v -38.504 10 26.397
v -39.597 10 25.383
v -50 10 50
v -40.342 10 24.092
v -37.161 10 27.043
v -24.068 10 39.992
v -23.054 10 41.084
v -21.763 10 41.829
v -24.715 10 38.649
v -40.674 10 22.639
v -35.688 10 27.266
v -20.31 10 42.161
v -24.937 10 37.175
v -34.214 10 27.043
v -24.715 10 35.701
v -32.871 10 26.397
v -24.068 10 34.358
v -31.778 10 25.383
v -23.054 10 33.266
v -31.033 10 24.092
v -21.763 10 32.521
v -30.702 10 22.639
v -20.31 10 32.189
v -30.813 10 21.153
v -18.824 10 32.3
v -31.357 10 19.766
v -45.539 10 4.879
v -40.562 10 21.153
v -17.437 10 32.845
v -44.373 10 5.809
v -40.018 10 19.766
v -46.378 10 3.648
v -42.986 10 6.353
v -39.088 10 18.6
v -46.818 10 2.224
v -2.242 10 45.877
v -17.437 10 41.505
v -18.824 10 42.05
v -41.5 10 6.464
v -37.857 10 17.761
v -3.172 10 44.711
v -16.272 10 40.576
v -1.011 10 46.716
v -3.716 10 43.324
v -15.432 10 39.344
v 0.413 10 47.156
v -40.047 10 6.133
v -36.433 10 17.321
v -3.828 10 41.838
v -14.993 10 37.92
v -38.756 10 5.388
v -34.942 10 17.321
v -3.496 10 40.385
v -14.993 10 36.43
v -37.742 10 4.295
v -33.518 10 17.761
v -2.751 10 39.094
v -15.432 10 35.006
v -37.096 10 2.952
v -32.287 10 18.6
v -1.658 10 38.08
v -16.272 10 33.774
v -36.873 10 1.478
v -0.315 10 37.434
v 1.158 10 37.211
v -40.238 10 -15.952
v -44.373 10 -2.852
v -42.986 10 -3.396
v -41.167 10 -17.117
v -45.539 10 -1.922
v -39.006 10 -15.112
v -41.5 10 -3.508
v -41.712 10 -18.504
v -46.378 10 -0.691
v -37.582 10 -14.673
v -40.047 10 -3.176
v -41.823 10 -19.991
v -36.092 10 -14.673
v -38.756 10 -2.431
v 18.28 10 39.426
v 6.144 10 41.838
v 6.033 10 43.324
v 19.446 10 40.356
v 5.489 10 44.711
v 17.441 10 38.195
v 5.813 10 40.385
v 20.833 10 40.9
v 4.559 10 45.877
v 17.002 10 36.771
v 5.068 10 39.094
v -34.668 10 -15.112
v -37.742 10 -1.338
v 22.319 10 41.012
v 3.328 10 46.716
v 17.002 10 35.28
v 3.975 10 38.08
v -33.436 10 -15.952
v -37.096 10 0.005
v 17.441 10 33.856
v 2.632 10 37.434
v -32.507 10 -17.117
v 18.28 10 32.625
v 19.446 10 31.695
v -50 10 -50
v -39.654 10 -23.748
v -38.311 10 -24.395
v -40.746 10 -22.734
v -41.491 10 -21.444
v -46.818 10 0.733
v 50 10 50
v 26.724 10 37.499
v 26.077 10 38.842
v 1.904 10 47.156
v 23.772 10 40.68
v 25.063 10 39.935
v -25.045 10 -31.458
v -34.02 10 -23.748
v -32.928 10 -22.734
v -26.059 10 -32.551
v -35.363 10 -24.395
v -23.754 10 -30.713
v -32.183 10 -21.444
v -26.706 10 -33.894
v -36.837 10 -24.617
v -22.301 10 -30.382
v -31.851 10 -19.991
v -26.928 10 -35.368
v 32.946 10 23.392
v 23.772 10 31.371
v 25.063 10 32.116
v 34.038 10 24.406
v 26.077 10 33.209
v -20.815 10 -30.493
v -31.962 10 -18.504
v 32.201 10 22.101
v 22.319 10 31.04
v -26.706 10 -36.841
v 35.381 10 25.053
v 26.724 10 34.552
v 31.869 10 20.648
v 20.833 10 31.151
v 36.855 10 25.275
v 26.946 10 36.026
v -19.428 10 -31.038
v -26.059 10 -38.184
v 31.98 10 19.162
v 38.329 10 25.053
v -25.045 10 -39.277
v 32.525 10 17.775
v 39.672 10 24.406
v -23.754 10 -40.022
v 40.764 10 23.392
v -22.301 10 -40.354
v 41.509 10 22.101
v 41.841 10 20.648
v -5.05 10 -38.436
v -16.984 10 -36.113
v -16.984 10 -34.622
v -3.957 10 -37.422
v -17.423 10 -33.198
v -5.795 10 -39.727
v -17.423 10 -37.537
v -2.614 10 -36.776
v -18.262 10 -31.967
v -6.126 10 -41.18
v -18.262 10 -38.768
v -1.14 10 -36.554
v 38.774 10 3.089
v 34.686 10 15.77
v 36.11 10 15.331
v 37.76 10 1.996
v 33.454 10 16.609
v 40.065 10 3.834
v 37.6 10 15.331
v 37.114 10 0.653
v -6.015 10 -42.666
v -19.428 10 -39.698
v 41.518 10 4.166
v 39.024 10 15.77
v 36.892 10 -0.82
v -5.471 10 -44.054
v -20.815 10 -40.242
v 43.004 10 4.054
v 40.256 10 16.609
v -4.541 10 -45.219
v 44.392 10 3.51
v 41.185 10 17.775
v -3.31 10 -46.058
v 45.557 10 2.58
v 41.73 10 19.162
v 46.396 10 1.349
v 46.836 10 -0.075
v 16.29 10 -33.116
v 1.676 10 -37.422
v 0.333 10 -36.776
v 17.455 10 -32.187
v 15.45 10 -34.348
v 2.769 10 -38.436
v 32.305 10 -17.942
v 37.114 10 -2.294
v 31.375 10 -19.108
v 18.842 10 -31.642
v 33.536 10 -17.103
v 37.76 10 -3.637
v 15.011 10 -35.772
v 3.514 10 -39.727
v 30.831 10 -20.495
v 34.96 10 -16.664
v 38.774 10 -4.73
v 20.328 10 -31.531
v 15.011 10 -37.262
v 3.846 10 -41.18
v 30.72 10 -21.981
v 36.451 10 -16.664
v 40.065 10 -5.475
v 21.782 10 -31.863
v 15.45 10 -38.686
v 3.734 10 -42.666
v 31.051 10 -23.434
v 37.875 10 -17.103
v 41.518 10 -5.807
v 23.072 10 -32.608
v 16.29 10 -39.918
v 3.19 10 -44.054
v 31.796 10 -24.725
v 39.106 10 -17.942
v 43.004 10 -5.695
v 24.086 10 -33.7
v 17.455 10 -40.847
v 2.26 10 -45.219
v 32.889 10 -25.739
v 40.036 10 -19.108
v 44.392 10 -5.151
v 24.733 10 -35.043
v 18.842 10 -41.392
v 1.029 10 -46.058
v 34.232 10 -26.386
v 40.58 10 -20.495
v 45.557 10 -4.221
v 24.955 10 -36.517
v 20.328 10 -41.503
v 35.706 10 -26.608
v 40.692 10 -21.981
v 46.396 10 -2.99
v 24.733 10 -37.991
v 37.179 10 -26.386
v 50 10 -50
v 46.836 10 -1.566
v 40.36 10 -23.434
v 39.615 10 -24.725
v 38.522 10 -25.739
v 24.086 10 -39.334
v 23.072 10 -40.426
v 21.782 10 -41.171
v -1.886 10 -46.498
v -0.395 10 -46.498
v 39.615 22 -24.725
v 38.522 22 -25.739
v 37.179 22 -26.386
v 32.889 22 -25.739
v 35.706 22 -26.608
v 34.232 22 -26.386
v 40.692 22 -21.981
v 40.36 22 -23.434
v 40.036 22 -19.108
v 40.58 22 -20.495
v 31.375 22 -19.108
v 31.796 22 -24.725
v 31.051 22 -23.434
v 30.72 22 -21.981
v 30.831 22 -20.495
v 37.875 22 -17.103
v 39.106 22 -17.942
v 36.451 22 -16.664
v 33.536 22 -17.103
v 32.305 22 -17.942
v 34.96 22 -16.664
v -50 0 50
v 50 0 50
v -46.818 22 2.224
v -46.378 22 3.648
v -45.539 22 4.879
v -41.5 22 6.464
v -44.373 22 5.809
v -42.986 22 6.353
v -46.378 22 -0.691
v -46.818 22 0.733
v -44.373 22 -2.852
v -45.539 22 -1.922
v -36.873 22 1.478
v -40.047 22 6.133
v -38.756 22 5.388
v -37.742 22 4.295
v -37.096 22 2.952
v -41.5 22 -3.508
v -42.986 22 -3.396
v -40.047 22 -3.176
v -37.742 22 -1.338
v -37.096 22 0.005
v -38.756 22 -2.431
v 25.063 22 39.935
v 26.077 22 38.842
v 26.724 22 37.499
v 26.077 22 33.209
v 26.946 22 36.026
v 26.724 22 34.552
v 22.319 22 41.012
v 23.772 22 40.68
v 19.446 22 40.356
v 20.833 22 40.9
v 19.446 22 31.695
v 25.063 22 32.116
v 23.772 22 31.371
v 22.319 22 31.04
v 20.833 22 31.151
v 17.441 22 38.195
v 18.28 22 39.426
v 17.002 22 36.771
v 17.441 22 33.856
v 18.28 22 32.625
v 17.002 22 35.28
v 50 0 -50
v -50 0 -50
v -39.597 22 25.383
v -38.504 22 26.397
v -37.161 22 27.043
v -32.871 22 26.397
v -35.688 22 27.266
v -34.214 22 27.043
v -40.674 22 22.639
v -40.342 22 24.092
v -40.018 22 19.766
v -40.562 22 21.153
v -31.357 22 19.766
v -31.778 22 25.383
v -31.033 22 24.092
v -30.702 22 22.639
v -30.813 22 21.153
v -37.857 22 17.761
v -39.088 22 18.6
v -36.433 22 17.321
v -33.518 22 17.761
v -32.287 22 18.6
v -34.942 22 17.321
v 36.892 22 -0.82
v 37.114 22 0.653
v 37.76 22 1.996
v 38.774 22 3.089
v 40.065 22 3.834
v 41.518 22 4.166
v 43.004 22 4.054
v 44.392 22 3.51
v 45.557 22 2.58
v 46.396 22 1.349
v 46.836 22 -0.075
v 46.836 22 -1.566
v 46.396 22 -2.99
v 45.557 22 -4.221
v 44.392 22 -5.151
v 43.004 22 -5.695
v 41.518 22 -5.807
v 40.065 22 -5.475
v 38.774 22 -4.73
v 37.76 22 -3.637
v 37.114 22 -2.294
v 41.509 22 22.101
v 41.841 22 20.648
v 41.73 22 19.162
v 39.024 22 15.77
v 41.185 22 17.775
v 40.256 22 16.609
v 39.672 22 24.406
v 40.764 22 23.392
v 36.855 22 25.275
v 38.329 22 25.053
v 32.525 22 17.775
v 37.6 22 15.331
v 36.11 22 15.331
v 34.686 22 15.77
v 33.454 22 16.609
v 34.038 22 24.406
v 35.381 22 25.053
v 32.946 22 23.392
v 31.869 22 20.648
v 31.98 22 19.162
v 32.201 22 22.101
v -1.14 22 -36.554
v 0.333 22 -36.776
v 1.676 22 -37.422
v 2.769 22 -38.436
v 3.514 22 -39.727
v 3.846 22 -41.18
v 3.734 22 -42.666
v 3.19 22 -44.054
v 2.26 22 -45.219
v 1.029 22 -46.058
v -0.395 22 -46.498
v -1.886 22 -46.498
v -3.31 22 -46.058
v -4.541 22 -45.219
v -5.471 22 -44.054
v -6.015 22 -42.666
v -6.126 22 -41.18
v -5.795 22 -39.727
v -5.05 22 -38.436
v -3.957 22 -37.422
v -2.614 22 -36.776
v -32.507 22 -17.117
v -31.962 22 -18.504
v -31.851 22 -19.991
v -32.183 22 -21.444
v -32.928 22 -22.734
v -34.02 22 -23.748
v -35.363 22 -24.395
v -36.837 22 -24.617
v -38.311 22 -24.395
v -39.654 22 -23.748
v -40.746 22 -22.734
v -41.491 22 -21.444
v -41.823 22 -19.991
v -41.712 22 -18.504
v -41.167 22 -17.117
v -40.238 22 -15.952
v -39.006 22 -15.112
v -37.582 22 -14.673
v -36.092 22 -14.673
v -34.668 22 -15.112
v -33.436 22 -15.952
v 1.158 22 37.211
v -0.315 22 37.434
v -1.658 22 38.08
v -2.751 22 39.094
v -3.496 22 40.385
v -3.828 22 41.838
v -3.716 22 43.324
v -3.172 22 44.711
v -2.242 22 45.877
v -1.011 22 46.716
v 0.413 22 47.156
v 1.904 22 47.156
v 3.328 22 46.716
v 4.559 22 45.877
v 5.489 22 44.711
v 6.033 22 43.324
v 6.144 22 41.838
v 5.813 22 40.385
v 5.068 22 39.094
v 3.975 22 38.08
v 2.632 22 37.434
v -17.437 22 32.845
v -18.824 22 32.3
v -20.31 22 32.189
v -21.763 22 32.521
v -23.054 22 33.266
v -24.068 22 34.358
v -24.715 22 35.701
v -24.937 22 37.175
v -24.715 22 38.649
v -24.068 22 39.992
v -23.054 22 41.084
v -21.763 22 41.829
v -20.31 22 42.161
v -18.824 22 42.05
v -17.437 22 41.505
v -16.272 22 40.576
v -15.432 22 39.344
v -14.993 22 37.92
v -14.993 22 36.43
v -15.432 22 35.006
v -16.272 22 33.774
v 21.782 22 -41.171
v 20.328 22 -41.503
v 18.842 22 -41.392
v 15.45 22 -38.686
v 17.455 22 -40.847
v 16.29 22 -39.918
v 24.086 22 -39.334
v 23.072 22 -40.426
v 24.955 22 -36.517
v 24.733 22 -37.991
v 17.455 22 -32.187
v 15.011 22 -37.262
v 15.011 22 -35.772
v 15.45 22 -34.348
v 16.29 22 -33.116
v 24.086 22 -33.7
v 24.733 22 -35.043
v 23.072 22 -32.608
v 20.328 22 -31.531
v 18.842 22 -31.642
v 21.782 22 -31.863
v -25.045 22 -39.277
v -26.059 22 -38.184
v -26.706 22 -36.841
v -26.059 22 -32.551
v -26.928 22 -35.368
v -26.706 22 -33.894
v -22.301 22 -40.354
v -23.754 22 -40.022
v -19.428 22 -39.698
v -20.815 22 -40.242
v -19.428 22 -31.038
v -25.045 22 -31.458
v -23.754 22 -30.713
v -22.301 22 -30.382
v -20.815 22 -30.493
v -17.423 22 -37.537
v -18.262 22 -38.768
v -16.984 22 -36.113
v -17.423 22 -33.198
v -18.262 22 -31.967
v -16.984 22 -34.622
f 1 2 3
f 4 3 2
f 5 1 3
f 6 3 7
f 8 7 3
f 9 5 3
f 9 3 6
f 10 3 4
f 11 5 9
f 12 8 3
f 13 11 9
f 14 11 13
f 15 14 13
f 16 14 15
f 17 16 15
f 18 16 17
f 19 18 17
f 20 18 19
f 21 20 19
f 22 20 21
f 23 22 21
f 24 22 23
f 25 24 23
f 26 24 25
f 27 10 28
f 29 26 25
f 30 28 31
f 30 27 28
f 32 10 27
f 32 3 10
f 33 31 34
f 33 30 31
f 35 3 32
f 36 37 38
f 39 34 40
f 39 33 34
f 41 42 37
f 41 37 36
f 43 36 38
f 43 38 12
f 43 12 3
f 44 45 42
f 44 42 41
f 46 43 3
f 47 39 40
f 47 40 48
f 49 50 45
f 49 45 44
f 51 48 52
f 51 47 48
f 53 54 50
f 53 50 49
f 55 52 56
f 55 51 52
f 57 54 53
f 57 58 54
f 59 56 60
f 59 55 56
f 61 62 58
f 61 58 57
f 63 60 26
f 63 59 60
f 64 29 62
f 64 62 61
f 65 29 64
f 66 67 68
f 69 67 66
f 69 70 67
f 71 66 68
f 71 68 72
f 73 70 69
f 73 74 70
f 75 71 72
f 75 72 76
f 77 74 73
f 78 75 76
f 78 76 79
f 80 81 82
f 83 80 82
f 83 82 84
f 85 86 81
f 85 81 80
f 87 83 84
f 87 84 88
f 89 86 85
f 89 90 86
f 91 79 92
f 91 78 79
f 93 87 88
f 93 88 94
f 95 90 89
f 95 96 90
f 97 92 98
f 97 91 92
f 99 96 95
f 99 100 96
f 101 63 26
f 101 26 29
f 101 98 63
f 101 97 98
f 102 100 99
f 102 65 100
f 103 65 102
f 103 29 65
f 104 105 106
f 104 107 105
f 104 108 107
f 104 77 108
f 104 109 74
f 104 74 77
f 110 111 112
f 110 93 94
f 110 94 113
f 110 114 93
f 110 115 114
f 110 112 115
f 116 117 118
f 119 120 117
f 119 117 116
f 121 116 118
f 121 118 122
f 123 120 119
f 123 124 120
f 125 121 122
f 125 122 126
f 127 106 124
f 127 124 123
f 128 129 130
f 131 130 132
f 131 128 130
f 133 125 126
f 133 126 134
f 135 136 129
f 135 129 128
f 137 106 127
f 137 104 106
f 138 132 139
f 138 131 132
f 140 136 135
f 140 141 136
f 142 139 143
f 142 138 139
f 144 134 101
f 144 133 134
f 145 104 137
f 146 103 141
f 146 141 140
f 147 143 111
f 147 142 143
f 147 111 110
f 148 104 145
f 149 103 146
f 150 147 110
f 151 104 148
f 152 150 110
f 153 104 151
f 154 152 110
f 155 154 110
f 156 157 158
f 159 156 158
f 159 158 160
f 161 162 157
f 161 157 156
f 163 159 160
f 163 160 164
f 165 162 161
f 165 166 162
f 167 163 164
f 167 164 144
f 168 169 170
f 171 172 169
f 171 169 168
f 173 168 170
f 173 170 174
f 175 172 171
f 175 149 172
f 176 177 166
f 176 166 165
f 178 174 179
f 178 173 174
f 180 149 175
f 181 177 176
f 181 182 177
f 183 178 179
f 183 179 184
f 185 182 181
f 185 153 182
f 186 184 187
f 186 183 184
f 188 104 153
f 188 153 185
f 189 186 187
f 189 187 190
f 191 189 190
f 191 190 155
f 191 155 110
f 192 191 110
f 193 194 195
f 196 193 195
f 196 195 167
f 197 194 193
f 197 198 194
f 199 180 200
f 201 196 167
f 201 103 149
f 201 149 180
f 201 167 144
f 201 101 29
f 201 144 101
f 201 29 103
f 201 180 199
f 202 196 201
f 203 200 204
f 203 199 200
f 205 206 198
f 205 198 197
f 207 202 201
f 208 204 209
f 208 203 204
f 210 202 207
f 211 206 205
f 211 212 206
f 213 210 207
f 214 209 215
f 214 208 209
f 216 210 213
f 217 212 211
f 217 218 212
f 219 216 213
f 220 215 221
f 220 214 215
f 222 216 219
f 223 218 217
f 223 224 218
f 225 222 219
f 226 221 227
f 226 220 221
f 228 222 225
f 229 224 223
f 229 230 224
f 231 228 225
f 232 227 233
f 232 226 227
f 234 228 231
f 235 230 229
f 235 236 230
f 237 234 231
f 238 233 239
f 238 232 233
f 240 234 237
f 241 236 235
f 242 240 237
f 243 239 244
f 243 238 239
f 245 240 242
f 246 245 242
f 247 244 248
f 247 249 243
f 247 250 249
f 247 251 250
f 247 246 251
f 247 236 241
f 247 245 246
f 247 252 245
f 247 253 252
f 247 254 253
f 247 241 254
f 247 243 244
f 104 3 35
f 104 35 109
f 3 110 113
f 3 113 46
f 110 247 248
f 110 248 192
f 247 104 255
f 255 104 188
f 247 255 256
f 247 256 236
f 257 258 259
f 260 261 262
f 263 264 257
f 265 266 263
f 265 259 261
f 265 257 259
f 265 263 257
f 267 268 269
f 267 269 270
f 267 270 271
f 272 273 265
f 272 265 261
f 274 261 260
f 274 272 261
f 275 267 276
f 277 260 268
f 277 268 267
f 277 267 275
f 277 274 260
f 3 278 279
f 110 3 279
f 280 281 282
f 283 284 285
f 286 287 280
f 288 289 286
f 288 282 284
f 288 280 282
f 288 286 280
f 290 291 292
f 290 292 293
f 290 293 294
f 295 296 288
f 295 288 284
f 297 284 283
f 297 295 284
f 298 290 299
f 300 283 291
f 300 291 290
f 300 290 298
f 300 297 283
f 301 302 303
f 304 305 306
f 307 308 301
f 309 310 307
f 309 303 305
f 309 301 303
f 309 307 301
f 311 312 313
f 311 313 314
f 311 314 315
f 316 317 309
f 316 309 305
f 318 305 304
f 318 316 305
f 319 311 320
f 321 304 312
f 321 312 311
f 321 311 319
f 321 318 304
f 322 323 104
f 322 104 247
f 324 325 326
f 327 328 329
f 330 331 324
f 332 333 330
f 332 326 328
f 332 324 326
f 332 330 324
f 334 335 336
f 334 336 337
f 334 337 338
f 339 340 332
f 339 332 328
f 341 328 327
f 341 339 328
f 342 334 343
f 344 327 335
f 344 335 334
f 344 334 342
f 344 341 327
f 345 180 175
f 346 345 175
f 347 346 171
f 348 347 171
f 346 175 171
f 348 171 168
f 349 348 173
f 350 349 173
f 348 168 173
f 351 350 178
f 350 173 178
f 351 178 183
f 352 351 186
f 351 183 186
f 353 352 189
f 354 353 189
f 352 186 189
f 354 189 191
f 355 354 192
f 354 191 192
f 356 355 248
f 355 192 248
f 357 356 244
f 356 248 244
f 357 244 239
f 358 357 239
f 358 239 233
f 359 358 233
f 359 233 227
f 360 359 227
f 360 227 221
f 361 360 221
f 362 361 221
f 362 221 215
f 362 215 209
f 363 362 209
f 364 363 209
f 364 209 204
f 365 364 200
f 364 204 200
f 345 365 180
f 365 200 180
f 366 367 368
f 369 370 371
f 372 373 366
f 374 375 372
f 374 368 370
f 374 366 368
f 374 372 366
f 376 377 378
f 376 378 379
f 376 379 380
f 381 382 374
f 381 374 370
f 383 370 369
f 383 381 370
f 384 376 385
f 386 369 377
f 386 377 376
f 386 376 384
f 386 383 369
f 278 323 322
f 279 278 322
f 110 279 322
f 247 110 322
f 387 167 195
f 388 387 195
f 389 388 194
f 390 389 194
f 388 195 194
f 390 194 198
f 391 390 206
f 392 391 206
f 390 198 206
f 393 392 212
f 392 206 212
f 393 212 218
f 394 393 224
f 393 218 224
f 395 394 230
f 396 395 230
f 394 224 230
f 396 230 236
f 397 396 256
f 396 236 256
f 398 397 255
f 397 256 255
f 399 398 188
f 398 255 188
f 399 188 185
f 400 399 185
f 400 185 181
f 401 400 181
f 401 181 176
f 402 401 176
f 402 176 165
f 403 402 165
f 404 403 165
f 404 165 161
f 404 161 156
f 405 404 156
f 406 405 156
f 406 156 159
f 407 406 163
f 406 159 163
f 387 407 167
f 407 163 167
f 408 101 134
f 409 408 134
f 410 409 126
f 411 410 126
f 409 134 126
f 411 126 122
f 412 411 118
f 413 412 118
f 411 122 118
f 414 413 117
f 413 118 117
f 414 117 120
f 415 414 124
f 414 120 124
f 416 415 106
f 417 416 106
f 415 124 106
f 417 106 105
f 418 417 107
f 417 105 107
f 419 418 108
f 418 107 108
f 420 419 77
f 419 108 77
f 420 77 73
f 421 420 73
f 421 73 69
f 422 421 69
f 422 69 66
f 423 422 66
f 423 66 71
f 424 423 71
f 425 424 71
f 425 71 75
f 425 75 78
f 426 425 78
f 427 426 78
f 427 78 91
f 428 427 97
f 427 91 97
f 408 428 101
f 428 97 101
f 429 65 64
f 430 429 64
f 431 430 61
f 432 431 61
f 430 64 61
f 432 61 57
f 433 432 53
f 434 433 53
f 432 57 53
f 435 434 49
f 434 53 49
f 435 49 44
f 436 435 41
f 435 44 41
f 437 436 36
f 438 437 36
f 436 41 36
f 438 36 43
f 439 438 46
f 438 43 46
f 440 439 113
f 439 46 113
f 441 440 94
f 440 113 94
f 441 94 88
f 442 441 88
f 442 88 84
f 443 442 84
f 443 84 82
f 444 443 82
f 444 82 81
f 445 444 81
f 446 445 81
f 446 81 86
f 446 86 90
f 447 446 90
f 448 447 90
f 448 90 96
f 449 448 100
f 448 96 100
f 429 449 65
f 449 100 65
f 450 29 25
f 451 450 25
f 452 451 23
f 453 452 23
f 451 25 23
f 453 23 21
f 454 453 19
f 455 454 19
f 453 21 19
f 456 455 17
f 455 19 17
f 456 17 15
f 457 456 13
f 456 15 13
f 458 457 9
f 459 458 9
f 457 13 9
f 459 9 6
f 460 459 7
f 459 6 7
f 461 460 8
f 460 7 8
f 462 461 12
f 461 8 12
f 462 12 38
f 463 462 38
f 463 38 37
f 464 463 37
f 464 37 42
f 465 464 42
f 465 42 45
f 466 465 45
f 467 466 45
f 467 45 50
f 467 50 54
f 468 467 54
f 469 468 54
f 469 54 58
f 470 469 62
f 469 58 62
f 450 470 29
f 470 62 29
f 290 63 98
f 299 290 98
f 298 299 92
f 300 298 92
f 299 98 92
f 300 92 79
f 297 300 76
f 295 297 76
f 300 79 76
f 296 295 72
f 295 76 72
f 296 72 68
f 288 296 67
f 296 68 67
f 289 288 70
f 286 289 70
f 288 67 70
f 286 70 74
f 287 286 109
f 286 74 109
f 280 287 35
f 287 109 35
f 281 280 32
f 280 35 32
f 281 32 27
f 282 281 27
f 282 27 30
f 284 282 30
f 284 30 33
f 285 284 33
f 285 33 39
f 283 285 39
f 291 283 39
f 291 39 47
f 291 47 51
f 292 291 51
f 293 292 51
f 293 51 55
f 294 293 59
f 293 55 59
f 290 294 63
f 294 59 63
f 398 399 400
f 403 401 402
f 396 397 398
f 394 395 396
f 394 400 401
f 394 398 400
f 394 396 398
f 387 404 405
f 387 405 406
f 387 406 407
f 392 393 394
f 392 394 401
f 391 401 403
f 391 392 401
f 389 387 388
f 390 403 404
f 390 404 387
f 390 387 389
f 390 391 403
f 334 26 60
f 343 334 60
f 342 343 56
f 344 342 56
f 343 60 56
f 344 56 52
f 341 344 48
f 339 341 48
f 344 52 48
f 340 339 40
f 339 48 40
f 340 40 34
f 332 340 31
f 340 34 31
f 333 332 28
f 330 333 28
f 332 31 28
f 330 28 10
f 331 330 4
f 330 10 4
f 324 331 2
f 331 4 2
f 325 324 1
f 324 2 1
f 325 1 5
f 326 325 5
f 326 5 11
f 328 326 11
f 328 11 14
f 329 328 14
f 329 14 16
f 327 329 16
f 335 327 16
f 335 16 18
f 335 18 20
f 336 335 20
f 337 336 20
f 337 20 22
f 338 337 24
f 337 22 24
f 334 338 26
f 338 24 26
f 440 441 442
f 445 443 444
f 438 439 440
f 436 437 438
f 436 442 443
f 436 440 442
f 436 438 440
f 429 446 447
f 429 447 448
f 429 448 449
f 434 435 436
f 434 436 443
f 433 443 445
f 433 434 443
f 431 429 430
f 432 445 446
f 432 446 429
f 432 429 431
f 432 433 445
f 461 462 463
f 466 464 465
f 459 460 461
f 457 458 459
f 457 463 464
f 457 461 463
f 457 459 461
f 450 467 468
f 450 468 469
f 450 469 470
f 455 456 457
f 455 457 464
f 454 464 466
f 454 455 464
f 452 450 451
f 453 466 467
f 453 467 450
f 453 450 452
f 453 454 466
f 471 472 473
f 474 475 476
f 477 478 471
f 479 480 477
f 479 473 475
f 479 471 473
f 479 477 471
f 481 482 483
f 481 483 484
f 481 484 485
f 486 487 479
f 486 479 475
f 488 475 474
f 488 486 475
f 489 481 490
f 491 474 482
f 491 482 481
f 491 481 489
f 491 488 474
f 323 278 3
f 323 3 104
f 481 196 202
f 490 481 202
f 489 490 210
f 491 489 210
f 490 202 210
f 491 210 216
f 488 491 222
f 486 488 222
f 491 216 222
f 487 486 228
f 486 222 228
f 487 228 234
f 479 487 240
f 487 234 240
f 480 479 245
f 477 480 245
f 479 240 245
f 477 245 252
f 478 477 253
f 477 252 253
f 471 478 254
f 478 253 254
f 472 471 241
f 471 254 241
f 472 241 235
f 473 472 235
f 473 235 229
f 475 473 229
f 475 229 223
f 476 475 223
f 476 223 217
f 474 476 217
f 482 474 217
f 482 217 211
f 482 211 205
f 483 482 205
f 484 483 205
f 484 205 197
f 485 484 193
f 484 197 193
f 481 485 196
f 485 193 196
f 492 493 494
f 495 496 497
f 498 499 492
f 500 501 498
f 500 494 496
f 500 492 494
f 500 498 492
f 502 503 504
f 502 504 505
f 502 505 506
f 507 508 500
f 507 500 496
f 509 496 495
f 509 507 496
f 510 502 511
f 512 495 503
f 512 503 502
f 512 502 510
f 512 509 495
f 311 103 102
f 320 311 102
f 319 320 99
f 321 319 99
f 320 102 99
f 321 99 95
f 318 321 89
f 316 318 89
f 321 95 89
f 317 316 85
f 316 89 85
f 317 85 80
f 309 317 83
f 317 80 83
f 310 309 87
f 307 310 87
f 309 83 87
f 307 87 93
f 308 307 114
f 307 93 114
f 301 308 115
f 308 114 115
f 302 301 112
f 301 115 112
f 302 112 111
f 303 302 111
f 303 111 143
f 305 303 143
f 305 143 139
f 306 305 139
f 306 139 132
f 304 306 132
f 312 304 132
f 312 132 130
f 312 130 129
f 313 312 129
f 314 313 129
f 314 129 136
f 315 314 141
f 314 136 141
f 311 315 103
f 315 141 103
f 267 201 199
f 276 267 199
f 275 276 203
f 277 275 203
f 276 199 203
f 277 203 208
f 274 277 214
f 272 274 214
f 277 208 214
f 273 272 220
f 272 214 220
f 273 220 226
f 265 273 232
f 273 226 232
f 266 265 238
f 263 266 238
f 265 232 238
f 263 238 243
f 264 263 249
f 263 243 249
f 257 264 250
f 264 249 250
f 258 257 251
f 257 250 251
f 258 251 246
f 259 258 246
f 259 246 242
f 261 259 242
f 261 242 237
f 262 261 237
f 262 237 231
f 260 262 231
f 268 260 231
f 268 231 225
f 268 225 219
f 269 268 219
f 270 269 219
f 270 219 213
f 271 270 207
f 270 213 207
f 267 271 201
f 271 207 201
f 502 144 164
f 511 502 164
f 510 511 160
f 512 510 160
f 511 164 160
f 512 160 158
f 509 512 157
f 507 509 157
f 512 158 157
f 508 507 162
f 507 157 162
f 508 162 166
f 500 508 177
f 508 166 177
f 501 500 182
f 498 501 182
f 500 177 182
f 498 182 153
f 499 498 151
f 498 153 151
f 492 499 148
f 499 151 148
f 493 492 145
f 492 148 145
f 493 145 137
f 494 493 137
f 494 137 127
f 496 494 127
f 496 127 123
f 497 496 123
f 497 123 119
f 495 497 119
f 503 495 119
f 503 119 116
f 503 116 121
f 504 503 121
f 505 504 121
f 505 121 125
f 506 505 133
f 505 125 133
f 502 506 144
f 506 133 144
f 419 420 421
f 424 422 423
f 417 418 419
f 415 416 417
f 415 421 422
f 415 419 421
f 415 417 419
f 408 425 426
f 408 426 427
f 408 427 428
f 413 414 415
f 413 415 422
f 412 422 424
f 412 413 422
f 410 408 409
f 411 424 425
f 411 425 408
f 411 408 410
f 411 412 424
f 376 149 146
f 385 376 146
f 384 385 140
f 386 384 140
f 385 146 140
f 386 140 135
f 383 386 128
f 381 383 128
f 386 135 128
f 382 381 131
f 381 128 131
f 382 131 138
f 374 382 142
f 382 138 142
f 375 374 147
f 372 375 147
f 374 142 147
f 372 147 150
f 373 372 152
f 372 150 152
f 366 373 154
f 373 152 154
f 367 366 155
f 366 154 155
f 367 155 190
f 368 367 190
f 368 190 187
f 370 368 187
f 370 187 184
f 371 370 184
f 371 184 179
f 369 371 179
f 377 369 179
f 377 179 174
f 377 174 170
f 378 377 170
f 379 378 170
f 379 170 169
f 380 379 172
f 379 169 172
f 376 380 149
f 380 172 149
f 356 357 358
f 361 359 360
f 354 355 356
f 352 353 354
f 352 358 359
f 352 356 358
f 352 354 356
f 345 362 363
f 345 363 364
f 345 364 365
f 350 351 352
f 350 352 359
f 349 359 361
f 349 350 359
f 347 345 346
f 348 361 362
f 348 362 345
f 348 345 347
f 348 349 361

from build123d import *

# Parameters (mm, degrees)
CROQUIS1_W              = 100
CROQUIS1_H              = 100
SALIENTE_EXTRUIR1_DEPTH = 10
CROQUIS2_R              = 5
SALIENTE_EXTRUIR2_DEPTH = 12
MATRIZC1_COUNT          = 12


with BuildPart() as part:
    # Croquis1 → Saliente-Extruir1 (new body)
    with BuildSketch(Plane(origin=(0, 0, 0), x_dir=(1, 0, 0), z_dir=(0, 1, 0))):
        Rectangle(CROQUIS1_W, CROQUIS1_H)
    extrude(amount=SALIENTE_EXTRUIR1_DEPTH)

    # Croquis2 → Saliente-Extruir2 (add)
    with BuildSketch(Plane(origin=(0, 10, 0), x_dir=(1, 0, 0), z_dir=(0, 1, 0))):
        with Locations(Location((-1.140405964, 41.553542307, 0), (0, 0, 270))):
            Circle(CROQUIS2_R)
    saliente_extruir2 = extrude(amount=SALIENTE_EXTRUIR2_DEPTH)

    # MatrizC1: Saliente-Extruir2 ×12 about axis
    matrizc1_axis = Axis((0.00902763, 0, 0.32894428), (0, 1, 0))
    for i in range(1, MATRIZC1_COUNT):
        add(saliente_extruir2.rotate(matrizc1_axis, i * 360 / MATRIZC1_COUNT))


solid = part.part
